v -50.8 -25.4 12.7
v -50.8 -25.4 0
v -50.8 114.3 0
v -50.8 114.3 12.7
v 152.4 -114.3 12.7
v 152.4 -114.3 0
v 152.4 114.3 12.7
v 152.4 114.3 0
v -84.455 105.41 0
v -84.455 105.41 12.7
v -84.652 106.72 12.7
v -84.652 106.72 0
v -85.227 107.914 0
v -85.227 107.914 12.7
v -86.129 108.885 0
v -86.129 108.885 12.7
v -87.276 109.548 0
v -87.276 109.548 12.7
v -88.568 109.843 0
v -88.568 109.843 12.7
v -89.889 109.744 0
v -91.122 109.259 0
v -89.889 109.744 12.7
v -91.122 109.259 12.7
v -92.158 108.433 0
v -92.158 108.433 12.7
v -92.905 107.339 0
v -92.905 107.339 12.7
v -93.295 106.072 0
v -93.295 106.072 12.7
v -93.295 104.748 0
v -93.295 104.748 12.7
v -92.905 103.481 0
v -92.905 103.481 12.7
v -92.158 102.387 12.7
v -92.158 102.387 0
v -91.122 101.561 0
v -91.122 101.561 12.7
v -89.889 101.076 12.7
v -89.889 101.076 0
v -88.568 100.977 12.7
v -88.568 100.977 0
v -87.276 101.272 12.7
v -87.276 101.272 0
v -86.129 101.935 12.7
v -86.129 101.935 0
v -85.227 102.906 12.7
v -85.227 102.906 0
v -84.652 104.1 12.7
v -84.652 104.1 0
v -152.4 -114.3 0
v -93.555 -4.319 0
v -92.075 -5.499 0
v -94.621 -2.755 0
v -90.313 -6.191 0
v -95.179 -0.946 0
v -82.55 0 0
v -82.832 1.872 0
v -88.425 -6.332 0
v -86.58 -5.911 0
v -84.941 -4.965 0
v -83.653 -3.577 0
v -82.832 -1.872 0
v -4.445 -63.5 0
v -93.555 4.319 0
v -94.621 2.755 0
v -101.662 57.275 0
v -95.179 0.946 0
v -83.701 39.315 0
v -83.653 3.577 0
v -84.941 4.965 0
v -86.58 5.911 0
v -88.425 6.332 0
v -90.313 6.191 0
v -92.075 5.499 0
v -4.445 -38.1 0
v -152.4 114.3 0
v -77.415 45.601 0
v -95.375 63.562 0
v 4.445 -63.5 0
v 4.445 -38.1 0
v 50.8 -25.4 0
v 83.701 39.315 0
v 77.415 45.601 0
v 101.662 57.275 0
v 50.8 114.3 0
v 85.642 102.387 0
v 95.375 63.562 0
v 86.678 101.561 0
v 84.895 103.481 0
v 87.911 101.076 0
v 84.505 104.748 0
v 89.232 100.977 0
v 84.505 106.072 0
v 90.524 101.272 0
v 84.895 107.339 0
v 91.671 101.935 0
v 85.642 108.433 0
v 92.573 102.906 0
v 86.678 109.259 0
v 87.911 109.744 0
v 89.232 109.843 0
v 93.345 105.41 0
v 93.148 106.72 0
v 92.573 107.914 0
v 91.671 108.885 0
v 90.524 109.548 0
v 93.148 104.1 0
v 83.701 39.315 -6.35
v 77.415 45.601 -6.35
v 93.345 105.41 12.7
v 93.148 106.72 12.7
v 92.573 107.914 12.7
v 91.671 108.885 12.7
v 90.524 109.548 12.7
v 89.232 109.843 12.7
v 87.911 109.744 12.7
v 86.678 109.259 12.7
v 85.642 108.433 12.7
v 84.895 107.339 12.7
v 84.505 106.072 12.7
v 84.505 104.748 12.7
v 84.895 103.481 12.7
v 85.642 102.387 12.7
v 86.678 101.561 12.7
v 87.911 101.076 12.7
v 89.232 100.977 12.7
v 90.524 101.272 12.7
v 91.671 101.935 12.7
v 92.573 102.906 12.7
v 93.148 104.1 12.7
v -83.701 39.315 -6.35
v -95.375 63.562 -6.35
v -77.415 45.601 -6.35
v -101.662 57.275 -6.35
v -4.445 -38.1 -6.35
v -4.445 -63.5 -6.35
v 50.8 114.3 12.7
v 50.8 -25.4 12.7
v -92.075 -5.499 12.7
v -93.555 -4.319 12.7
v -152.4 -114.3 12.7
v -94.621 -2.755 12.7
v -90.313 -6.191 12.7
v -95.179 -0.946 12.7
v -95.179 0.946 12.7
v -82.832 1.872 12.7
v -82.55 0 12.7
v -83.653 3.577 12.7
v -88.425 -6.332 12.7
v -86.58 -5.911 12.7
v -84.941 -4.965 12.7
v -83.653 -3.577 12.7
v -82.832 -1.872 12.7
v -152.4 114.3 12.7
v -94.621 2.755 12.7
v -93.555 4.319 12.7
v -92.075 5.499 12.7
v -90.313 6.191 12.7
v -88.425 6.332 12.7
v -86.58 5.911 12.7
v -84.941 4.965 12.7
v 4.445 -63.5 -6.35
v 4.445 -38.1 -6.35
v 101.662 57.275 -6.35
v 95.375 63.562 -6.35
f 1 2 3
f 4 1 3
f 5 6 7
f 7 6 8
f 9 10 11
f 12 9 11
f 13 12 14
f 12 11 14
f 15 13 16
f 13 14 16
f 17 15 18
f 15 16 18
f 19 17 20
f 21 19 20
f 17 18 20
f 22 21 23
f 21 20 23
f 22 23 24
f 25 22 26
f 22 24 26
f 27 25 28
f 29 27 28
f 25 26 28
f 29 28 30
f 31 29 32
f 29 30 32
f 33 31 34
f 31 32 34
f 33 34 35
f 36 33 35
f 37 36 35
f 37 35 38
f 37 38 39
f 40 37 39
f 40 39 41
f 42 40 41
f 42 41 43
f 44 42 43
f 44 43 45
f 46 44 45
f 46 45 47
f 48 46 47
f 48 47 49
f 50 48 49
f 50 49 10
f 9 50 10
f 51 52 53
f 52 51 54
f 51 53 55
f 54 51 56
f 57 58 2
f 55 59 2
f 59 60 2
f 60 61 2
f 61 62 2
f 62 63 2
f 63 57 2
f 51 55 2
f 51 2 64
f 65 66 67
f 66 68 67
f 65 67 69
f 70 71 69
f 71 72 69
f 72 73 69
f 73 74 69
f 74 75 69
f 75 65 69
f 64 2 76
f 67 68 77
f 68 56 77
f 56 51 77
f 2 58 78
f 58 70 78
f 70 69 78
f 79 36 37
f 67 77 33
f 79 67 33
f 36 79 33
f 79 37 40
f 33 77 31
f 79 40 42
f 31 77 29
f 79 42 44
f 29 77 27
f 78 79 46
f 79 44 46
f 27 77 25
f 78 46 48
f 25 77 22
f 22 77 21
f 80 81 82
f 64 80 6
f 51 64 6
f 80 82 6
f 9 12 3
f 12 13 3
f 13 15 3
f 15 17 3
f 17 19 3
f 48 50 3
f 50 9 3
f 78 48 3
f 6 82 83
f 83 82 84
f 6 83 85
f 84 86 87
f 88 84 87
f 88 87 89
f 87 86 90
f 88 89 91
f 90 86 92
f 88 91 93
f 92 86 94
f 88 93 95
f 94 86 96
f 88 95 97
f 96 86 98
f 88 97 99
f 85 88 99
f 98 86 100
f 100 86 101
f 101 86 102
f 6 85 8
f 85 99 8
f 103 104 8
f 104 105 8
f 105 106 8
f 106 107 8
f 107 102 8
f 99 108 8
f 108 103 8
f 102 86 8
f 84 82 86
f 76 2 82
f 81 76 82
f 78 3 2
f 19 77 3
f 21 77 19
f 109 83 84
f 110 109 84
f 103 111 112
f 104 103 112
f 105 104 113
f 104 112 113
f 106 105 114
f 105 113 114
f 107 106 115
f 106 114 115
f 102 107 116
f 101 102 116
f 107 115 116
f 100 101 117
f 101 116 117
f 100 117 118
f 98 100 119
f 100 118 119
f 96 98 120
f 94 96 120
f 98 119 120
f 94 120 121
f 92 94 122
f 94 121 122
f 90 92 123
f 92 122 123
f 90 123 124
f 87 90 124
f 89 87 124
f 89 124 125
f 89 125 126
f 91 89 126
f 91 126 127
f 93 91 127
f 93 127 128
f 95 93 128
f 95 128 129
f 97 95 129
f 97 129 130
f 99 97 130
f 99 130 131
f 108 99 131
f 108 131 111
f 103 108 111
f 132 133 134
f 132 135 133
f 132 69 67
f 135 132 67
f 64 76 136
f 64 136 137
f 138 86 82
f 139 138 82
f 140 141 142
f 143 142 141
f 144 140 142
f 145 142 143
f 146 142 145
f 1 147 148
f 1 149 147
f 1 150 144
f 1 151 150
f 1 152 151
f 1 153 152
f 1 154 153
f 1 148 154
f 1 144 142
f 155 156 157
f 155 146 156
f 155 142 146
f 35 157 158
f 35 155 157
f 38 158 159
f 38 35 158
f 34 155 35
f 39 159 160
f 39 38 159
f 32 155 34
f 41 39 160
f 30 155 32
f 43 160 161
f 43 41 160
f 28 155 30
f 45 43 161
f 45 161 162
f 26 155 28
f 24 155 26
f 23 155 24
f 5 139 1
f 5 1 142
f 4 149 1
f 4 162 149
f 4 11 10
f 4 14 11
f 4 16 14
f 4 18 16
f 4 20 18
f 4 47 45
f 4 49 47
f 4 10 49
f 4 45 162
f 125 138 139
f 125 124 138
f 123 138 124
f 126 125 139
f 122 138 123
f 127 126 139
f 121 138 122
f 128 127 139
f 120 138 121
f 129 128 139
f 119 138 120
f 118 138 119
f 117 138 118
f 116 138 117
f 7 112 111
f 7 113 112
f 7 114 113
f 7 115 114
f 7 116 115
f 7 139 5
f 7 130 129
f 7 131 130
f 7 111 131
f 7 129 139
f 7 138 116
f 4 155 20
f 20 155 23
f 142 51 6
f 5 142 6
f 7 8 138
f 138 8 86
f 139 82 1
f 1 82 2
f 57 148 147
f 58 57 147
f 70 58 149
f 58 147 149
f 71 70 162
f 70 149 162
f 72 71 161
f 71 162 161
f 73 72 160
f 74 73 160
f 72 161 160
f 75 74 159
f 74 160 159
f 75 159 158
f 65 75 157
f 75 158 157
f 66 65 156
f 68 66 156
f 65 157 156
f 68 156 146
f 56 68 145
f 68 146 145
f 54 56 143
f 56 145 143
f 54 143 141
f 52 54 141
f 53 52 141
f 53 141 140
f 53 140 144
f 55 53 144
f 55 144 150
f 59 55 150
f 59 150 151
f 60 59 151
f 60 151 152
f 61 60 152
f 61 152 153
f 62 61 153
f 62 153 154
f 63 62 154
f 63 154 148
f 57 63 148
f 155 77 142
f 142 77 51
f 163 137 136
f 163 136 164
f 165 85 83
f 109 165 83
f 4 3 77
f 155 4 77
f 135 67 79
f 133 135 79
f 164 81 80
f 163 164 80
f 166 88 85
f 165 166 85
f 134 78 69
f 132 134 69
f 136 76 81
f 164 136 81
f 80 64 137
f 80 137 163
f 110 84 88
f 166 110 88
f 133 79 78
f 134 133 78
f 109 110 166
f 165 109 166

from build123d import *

# Parameters (mm, degrees)
F1_DEPTH = 12.7
F3_R     = 6.35
F4_DEPTH = 25.4
F2_R     = 4.445
F5_DEPTH = 25.4
F6_W     = 8.89
F6_H     = 25.4
F7_DEPTH = 6.35


with BuildPart() as f1:
    # F0 (on Top) → F1 (new body)
    with BuildSketch(Plane.XY):
        Polygon((152.4, -114.3), (152.4, 114.3), (50.8, 114.3), (50.8, -25.4), (-50.8, -25.4), (-50.8, 114.3), (-152.4, 114.3), (-152.4, -114.3), align=None)
    extrude(amount=F1_DEPTH)

    # F3 (on face) → F4 (cut)
    with BuildSketch(Plane.XY.offset(12.7)):
        with Locations((-88.9, 0)):
            Circle(F3_R)
    extrude(amount=-F4_DEPTH, mode=Mode.SUBTRACT)

    # F2 (on face) → F5 (cut)
    with BuildSketch(Plane.XY.offset(12.7)):
        with Locations((-88.9, 105.41)):
            Circle(F2_R)
        with Locations((88.9, 105.41)):
            Circle(F2_R)
    extrude(amount=-F5_DEPTH, mode=Mode.SUBTRACT)

    # F6 (on face) → F7 (join)
    with BuildSketch(Plane(origin=(0, 0, 0), x_dir=(1, 0, 0), z_dir=(0, 0, -1))):
        Polygon((83.7010406738, -39.3148613891), (77.4148613891, -45.6010406738), (95.3753736312, -63.561552916), (101.661552916, -57.2753736312), align=None)
        with Locations((0, 50.8)):
            Rectangle(F6_W, F6_H)
        Polygon((-95.3753736312, -63.561552916), (-77.4148613891, -45.6010406738), (-83.7010406738, -39.3148613891), (-101.661552916, -57.2753736312), align=None)
    extrude(amount=F7_DEPTH)


solid = f1.part
